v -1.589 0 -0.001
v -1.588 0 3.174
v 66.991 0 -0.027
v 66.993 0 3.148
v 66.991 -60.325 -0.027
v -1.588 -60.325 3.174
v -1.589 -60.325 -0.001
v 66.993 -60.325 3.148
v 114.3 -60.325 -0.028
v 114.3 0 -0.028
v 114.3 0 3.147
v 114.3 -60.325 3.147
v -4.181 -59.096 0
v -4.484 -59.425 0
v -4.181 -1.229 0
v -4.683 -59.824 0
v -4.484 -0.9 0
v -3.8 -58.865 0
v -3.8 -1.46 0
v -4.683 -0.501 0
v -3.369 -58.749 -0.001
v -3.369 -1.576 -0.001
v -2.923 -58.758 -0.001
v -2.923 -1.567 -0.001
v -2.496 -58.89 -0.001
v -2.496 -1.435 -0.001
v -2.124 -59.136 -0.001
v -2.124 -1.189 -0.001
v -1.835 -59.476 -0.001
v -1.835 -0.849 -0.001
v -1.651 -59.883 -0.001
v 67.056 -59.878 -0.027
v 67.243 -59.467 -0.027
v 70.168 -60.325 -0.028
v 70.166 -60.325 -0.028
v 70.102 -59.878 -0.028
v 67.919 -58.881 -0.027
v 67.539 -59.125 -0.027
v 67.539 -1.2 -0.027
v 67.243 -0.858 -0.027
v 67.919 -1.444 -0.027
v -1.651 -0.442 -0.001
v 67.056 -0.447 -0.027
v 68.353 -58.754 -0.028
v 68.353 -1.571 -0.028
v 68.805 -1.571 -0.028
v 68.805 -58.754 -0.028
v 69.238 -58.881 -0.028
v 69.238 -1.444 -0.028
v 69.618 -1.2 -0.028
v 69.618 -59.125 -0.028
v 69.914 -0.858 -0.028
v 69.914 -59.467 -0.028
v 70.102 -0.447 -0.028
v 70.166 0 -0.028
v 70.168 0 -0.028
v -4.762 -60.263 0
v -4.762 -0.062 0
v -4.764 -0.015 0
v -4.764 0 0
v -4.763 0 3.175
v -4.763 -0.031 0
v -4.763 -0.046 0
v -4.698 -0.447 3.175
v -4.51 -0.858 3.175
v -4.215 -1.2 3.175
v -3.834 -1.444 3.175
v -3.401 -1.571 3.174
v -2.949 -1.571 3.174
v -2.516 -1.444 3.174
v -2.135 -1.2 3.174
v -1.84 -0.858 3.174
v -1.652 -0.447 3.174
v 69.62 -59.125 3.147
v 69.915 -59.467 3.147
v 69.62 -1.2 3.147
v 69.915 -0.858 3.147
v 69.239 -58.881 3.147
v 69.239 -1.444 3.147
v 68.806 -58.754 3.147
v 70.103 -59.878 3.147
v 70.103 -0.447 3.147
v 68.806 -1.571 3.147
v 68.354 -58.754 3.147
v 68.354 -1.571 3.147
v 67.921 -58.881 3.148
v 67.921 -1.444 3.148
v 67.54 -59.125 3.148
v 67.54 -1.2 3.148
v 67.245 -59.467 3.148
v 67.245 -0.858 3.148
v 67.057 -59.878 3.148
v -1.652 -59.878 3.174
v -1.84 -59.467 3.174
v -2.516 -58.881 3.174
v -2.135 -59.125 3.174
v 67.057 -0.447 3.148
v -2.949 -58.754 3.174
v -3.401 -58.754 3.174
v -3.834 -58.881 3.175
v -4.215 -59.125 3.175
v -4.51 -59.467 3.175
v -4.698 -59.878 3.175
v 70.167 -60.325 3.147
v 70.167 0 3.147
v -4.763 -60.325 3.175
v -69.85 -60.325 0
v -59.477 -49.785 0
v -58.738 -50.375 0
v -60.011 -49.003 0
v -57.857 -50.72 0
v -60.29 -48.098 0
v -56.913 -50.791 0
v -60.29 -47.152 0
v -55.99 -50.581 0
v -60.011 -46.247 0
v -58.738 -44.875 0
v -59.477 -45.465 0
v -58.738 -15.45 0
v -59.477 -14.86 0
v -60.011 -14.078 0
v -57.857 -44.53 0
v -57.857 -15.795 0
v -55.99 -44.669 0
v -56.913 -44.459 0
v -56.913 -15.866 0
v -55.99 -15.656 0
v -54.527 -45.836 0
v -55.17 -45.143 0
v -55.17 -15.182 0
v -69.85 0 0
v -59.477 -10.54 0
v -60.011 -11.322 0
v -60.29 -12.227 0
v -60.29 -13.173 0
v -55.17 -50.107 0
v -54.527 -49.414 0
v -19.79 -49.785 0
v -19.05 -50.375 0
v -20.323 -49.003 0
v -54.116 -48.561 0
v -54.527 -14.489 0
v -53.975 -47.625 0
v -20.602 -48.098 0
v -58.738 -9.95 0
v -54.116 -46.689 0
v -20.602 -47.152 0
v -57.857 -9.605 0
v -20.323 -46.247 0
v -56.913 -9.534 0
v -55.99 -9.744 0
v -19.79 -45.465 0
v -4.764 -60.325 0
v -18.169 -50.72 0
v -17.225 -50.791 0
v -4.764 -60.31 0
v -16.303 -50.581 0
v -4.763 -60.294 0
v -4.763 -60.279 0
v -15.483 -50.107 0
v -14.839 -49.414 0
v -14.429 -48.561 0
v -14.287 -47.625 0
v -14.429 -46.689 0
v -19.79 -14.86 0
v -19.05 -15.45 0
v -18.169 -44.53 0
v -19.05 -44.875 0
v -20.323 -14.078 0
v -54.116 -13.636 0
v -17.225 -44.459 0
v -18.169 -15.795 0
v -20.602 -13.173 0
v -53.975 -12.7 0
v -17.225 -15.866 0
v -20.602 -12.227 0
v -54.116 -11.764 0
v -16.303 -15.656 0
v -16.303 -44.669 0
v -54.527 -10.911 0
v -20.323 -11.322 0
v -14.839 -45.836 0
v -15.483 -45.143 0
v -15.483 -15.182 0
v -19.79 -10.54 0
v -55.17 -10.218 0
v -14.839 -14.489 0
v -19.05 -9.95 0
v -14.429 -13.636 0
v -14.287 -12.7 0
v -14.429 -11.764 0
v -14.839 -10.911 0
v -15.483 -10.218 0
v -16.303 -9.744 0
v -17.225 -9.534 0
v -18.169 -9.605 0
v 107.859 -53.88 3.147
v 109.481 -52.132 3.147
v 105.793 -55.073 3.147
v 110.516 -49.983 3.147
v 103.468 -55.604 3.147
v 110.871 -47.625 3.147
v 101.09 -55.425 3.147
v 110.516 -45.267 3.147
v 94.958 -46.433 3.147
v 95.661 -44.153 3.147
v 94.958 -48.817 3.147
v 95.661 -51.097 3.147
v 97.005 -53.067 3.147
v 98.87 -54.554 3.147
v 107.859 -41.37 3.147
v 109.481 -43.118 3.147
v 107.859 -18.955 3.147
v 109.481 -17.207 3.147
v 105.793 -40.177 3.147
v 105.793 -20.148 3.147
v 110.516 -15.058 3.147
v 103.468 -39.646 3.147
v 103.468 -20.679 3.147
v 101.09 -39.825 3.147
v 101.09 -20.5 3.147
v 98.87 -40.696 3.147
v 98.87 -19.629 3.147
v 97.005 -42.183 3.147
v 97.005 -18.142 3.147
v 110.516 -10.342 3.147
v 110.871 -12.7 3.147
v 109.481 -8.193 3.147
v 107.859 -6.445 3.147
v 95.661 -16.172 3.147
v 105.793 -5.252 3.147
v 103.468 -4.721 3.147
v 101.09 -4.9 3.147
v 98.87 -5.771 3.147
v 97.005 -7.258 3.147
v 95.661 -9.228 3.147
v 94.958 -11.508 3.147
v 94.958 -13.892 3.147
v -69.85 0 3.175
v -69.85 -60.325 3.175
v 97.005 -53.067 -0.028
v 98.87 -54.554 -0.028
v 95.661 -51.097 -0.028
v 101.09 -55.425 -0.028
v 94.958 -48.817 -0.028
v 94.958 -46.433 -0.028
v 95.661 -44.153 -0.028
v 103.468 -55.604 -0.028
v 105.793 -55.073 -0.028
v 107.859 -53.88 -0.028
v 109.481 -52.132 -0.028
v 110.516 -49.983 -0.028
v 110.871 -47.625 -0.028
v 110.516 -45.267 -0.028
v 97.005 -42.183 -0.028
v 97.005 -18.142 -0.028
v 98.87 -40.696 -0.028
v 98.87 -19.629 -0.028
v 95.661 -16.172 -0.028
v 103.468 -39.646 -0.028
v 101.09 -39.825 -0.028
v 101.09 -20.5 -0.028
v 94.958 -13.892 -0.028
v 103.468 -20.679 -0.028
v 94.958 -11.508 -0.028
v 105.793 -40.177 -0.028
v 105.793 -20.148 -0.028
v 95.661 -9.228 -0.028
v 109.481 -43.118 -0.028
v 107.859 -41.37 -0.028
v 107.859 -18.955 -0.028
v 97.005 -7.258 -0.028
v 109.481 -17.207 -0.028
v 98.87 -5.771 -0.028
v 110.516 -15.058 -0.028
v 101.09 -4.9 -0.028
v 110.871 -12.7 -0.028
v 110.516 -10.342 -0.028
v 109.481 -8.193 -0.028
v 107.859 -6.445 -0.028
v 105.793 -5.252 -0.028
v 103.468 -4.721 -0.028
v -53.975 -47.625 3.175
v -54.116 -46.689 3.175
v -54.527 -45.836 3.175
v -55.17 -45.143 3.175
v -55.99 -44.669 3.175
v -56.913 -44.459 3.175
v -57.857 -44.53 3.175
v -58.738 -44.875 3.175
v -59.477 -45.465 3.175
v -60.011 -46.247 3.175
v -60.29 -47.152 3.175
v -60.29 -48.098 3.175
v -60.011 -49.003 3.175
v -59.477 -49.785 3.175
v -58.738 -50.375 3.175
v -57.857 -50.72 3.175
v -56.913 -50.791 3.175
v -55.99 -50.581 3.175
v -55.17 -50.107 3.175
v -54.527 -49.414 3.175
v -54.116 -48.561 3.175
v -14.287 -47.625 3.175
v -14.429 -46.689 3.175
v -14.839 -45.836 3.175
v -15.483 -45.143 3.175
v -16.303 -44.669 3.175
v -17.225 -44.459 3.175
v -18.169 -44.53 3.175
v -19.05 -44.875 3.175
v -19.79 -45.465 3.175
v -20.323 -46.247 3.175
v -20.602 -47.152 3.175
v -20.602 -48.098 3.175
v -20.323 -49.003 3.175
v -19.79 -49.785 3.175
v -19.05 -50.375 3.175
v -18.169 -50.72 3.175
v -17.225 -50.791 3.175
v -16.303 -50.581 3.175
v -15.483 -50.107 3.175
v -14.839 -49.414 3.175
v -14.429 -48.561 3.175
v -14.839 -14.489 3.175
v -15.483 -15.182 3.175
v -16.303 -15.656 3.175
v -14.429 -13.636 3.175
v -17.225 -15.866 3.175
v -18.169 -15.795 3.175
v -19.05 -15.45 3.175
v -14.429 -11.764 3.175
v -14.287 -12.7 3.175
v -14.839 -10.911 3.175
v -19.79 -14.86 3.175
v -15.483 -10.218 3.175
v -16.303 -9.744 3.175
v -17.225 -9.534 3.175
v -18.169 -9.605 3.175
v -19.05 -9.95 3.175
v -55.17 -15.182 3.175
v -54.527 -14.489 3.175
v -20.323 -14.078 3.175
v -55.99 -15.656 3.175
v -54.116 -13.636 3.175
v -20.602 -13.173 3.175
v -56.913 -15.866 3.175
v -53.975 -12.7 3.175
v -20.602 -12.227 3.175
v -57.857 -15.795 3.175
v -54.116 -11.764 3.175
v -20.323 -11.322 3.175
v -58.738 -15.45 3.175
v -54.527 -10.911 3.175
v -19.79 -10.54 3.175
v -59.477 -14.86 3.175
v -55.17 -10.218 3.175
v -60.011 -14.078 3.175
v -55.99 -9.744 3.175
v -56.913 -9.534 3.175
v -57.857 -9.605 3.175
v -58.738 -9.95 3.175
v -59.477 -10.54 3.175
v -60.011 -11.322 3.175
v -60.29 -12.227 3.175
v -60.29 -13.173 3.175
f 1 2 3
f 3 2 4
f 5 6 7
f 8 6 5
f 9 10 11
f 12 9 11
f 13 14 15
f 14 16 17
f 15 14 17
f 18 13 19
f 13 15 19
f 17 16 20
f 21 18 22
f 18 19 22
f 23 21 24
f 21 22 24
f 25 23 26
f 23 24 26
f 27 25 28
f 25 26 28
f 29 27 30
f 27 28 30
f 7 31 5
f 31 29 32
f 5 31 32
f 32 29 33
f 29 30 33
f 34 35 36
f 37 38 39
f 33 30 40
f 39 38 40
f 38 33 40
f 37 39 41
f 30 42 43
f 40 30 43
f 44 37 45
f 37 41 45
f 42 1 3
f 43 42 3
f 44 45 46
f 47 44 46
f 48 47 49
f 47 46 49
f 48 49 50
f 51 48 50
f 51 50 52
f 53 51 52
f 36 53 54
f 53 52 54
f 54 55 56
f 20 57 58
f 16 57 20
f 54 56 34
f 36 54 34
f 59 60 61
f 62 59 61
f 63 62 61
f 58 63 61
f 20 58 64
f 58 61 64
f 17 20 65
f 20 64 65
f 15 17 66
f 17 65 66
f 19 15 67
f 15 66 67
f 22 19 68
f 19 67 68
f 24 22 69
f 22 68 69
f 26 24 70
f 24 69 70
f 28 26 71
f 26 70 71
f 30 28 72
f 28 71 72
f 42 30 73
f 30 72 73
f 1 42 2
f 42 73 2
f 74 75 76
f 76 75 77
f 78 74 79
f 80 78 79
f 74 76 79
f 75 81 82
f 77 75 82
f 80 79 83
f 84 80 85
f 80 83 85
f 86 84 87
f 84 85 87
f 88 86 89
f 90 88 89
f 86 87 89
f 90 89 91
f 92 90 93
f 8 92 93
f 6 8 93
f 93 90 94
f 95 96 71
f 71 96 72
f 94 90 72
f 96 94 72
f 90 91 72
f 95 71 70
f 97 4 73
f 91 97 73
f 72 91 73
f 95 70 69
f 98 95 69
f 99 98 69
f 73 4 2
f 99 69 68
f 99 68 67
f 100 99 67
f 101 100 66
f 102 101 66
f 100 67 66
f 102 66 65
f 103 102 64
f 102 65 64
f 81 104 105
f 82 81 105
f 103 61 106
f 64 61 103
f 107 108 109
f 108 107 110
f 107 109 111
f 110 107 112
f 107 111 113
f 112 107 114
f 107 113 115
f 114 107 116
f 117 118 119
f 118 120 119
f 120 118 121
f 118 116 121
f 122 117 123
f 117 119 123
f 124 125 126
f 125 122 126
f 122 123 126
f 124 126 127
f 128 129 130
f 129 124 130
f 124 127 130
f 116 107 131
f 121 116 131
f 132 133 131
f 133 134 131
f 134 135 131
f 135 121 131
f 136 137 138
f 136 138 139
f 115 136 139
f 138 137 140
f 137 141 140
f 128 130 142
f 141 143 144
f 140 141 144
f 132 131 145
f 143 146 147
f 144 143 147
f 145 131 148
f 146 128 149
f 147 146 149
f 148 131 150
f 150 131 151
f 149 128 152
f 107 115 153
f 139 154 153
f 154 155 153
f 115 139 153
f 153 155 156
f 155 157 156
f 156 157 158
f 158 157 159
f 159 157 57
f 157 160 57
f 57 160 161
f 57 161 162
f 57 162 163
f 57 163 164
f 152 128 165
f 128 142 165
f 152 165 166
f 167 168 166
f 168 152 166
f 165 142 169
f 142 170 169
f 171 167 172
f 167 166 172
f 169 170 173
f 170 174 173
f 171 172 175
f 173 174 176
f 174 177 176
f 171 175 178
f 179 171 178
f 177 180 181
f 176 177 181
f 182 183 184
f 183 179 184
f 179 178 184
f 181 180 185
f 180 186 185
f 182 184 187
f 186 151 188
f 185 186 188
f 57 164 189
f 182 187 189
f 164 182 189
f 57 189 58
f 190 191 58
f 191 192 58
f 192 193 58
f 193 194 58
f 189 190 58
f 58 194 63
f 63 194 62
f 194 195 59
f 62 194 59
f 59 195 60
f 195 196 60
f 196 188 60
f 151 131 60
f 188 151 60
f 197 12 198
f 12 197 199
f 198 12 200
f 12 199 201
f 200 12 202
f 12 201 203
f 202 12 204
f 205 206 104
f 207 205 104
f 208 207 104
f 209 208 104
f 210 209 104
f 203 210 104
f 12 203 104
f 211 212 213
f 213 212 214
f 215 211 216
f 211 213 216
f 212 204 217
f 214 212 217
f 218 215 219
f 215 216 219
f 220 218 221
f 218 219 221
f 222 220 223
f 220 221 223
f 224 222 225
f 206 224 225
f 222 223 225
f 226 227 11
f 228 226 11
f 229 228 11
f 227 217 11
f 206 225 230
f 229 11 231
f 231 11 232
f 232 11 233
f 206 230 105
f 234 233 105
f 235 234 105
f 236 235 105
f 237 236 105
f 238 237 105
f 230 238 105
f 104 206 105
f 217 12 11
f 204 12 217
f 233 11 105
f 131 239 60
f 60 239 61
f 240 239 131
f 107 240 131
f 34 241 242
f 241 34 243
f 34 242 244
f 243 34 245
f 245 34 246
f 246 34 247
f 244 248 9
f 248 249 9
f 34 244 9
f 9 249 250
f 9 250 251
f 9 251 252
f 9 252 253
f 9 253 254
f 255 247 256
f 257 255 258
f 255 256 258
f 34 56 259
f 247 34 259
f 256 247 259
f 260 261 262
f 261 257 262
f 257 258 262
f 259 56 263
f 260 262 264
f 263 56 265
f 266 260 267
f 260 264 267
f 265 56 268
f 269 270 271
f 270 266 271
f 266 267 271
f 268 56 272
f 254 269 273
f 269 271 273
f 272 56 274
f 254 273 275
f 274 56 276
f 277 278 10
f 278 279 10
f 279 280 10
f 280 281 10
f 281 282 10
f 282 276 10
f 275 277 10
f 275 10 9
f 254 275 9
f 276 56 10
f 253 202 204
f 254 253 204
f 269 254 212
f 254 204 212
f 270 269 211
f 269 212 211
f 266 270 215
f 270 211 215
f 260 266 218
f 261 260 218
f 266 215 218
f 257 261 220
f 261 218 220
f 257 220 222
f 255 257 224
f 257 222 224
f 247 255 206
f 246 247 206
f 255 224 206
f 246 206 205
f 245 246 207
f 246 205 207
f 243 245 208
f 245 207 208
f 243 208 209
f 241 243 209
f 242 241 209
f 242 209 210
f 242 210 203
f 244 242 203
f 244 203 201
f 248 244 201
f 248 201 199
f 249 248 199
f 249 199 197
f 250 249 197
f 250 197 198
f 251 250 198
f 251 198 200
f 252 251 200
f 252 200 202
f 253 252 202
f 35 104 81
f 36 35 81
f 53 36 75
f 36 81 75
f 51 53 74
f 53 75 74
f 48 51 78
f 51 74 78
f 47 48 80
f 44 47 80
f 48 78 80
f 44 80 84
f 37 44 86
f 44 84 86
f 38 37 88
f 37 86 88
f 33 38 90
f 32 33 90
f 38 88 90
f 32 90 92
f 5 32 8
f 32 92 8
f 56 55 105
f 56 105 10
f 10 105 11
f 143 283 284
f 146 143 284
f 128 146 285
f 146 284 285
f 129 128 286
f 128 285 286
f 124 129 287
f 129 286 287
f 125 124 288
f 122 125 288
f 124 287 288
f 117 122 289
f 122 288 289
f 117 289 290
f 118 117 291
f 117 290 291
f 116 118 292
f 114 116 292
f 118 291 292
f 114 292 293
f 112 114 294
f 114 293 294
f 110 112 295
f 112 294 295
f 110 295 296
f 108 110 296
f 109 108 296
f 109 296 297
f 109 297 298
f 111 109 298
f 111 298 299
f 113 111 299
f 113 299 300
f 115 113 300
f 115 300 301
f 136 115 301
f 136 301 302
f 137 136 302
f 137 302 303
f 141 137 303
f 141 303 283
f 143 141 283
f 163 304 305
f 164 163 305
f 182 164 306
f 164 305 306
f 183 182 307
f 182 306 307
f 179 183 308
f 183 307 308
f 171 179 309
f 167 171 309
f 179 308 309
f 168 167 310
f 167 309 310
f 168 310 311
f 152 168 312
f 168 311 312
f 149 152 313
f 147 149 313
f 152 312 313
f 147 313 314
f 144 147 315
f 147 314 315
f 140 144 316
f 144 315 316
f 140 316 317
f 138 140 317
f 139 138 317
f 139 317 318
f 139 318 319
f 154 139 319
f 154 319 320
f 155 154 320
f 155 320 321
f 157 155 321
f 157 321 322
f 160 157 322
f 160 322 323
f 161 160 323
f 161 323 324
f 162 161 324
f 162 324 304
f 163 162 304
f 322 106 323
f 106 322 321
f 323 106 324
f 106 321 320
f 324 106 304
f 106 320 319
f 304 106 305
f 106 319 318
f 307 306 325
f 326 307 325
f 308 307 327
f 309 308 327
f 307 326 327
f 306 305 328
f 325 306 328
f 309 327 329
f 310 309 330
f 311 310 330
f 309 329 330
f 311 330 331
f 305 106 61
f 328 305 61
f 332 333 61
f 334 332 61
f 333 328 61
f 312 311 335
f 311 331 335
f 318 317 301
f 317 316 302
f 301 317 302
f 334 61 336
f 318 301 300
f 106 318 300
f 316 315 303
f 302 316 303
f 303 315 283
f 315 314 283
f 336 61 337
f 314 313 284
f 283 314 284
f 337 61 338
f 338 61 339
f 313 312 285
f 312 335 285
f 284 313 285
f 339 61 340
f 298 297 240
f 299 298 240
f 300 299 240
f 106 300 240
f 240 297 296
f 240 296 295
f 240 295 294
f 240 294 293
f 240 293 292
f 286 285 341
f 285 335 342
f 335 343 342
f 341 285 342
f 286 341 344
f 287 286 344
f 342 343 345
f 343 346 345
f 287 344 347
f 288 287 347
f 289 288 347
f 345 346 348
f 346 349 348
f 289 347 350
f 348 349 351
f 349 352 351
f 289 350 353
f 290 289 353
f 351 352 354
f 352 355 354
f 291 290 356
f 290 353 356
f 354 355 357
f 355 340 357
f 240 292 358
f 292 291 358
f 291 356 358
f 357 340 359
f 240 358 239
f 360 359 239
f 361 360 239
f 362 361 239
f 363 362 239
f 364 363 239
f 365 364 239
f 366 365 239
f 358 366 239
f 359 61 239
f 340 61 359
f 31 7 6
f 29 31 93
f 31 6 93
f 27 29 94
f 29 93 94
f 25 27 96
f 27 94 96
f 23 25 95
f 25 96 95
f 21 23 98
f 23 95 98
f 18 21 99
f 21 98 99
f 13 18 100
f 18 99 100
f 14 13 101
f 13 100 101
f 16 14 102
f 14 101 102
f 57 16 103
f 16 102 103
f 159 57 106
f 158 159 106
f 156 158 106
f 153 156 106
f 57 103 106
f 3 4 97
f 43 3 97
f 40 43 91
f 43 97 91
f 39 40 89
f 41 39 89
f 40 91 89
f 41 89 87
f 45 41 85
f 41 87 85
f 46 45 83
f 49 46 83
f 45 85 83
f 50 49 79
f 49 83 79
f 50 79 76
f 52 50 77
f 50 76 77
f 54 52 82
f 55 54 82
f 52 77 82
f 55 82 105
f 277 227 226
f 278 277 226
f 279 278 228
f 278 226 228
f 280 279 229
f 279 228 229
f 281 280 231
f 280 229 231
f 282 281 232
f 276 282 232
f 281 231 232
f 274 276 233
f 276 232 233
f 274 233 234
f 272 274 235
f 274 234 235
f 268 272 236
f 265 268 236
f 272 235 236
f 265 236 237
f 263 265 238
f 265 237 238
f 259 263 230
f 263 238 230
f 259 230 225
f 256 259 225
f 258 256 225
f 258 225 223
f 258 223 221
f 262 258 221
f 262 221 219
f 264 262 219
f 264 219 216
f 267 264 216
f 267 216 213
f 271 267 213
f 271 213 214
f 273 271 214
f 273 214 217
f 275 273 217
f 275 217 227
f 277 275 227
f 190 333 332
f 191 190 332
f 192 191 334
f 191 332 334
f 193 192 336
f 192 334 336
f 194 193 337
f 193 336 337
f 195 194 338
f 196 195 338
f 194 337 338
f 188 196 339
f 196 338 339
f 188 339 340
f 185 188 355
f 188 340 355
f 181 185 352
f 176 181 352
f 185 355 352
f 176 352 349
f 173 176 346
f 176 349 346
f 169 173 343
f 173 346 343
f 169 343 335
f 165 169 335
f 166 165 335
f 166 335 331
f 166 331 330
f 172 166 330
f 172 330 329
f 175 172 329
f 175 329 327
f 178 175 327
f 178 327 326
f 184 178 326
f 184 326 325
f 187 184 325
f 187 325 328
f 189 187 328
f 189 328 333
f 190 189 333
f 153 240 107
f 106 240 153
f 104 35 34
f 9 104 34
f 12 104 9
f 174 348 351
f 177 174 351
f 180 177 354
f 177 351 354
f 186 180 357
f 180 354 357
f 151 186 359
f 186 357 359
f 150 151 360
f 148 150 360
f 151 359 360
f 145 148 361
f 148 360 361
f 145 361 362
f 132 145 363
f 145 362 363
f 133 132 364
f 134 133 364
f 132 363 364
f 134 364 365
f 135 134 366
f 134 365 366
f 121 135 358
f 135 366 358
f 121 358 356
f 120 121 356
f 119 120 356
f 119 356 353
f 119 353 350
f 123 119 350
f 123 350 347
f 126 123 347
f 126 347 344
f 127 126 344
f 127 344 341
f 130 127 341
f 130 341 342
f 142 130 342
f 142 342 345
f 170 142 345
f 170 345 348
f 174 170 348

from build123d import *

# Parameters (mm, degrees)
F1_DEPTH = 60.325
F2_R     = 8.001
F3_DEPTH = 25.4
F4_R     = 3.175
F5_DEPTH = 25.4
F6_R     = 3.175
F7_DEPTH = 25.4
F9_DEPTH = 25.4


with BuildPart() as f1:
    # F0 (on Front) → F1 (new body)
    with BuildSketch(Plane.XZ):
        Polygon((-4.7625, 3.175), (-69.85, 3.175), (-69.85, 0), (-4.7625, 0), (70.1675, -0.0282659046), (114.3, -0.0282659046), (114.3, 3.1467340954), (70.1675, 3.1467340954), align=None)
    extrude(amount=F1_DEPTH)

    # F2 (on face) → F3 (cut)
    with BuildSketch(Plane.XY.offset(3.1467340954)):
        with Locations((102.87, -12.7)):
            Circle(F2_R)
        with Locations((102.87, -47.625)):
            Circle(F2_R)
    extrude(amount=-F3_DEPTH, mode=Mode.SUBTRACT)

    # F4 (on face) → F5 (cut)
    with BuildSketch(Plane.XY.offset(3.175)):
        with Locations((-57.15, -12.7)):
            Circle(F4_R)
        with Locations((-57.15, -47.625)):
            Circle(F4_R)
    extrude(amount=-F5_DEPTH, mode=Mode.SUBTRACT)

    # F6 (on face) → F7 (cut)
    with BuildSketch(Plane.XY.offset(3.175)):
        with Locations((-17.4625, -12.7)):
            Circle(F6_R)
        with Locations((-17.4625, -47.625)):
            Circle(F6_R)
    extrude(amount=-F7_DEPTH, mode=Mode.SUBTRACT)

    # F8 (on face) → F9 (cut)
    with BuildSketch(Plane(origin=(0.0011970299, 0, 3.1732029867), x_dir=(0.9999999288, 0, -0.0003772308), z_dir=(0.0003772308, 0, 0.9999999288))):
        with BuildLine():
            ThreePointArc((-1.5886973689, -60.325), (-3.1761973689, -58.7375), (-4.7636973689, -60.325))
            Line((-4.7636973689, -60.325), (-1.5886973689, -60.325))
        make_face()
        with BuildLine():
            ThreePointArc((70.1663079625, -60.325), (68.5788079625, -58.7375), (66.9913079625, -60.325))
            Line((66.9913079625, -60.325), (70.1663079625, -60.325))
        make_face()
        with BuildLine():
            Line((70.1663079625, 0), (66.9913079625, 0))
            ThreePointArc((66.9913079625, 0), (68.5788079625, -1.5875), (70.1663079625, 0))
        make_face()
        with BuildLine():
            Line((-1.5886973689, 0), (-4.7636973689, 0))
            ThreePointArc((-4.7636973689, 0), (-3.1761973689, -1.5875), (-1.5886973689, 0))
        make_face()
    extrude(amount=-F9_DEPTH, mode=Mode.SUBTRACT)


solid = f1.part
